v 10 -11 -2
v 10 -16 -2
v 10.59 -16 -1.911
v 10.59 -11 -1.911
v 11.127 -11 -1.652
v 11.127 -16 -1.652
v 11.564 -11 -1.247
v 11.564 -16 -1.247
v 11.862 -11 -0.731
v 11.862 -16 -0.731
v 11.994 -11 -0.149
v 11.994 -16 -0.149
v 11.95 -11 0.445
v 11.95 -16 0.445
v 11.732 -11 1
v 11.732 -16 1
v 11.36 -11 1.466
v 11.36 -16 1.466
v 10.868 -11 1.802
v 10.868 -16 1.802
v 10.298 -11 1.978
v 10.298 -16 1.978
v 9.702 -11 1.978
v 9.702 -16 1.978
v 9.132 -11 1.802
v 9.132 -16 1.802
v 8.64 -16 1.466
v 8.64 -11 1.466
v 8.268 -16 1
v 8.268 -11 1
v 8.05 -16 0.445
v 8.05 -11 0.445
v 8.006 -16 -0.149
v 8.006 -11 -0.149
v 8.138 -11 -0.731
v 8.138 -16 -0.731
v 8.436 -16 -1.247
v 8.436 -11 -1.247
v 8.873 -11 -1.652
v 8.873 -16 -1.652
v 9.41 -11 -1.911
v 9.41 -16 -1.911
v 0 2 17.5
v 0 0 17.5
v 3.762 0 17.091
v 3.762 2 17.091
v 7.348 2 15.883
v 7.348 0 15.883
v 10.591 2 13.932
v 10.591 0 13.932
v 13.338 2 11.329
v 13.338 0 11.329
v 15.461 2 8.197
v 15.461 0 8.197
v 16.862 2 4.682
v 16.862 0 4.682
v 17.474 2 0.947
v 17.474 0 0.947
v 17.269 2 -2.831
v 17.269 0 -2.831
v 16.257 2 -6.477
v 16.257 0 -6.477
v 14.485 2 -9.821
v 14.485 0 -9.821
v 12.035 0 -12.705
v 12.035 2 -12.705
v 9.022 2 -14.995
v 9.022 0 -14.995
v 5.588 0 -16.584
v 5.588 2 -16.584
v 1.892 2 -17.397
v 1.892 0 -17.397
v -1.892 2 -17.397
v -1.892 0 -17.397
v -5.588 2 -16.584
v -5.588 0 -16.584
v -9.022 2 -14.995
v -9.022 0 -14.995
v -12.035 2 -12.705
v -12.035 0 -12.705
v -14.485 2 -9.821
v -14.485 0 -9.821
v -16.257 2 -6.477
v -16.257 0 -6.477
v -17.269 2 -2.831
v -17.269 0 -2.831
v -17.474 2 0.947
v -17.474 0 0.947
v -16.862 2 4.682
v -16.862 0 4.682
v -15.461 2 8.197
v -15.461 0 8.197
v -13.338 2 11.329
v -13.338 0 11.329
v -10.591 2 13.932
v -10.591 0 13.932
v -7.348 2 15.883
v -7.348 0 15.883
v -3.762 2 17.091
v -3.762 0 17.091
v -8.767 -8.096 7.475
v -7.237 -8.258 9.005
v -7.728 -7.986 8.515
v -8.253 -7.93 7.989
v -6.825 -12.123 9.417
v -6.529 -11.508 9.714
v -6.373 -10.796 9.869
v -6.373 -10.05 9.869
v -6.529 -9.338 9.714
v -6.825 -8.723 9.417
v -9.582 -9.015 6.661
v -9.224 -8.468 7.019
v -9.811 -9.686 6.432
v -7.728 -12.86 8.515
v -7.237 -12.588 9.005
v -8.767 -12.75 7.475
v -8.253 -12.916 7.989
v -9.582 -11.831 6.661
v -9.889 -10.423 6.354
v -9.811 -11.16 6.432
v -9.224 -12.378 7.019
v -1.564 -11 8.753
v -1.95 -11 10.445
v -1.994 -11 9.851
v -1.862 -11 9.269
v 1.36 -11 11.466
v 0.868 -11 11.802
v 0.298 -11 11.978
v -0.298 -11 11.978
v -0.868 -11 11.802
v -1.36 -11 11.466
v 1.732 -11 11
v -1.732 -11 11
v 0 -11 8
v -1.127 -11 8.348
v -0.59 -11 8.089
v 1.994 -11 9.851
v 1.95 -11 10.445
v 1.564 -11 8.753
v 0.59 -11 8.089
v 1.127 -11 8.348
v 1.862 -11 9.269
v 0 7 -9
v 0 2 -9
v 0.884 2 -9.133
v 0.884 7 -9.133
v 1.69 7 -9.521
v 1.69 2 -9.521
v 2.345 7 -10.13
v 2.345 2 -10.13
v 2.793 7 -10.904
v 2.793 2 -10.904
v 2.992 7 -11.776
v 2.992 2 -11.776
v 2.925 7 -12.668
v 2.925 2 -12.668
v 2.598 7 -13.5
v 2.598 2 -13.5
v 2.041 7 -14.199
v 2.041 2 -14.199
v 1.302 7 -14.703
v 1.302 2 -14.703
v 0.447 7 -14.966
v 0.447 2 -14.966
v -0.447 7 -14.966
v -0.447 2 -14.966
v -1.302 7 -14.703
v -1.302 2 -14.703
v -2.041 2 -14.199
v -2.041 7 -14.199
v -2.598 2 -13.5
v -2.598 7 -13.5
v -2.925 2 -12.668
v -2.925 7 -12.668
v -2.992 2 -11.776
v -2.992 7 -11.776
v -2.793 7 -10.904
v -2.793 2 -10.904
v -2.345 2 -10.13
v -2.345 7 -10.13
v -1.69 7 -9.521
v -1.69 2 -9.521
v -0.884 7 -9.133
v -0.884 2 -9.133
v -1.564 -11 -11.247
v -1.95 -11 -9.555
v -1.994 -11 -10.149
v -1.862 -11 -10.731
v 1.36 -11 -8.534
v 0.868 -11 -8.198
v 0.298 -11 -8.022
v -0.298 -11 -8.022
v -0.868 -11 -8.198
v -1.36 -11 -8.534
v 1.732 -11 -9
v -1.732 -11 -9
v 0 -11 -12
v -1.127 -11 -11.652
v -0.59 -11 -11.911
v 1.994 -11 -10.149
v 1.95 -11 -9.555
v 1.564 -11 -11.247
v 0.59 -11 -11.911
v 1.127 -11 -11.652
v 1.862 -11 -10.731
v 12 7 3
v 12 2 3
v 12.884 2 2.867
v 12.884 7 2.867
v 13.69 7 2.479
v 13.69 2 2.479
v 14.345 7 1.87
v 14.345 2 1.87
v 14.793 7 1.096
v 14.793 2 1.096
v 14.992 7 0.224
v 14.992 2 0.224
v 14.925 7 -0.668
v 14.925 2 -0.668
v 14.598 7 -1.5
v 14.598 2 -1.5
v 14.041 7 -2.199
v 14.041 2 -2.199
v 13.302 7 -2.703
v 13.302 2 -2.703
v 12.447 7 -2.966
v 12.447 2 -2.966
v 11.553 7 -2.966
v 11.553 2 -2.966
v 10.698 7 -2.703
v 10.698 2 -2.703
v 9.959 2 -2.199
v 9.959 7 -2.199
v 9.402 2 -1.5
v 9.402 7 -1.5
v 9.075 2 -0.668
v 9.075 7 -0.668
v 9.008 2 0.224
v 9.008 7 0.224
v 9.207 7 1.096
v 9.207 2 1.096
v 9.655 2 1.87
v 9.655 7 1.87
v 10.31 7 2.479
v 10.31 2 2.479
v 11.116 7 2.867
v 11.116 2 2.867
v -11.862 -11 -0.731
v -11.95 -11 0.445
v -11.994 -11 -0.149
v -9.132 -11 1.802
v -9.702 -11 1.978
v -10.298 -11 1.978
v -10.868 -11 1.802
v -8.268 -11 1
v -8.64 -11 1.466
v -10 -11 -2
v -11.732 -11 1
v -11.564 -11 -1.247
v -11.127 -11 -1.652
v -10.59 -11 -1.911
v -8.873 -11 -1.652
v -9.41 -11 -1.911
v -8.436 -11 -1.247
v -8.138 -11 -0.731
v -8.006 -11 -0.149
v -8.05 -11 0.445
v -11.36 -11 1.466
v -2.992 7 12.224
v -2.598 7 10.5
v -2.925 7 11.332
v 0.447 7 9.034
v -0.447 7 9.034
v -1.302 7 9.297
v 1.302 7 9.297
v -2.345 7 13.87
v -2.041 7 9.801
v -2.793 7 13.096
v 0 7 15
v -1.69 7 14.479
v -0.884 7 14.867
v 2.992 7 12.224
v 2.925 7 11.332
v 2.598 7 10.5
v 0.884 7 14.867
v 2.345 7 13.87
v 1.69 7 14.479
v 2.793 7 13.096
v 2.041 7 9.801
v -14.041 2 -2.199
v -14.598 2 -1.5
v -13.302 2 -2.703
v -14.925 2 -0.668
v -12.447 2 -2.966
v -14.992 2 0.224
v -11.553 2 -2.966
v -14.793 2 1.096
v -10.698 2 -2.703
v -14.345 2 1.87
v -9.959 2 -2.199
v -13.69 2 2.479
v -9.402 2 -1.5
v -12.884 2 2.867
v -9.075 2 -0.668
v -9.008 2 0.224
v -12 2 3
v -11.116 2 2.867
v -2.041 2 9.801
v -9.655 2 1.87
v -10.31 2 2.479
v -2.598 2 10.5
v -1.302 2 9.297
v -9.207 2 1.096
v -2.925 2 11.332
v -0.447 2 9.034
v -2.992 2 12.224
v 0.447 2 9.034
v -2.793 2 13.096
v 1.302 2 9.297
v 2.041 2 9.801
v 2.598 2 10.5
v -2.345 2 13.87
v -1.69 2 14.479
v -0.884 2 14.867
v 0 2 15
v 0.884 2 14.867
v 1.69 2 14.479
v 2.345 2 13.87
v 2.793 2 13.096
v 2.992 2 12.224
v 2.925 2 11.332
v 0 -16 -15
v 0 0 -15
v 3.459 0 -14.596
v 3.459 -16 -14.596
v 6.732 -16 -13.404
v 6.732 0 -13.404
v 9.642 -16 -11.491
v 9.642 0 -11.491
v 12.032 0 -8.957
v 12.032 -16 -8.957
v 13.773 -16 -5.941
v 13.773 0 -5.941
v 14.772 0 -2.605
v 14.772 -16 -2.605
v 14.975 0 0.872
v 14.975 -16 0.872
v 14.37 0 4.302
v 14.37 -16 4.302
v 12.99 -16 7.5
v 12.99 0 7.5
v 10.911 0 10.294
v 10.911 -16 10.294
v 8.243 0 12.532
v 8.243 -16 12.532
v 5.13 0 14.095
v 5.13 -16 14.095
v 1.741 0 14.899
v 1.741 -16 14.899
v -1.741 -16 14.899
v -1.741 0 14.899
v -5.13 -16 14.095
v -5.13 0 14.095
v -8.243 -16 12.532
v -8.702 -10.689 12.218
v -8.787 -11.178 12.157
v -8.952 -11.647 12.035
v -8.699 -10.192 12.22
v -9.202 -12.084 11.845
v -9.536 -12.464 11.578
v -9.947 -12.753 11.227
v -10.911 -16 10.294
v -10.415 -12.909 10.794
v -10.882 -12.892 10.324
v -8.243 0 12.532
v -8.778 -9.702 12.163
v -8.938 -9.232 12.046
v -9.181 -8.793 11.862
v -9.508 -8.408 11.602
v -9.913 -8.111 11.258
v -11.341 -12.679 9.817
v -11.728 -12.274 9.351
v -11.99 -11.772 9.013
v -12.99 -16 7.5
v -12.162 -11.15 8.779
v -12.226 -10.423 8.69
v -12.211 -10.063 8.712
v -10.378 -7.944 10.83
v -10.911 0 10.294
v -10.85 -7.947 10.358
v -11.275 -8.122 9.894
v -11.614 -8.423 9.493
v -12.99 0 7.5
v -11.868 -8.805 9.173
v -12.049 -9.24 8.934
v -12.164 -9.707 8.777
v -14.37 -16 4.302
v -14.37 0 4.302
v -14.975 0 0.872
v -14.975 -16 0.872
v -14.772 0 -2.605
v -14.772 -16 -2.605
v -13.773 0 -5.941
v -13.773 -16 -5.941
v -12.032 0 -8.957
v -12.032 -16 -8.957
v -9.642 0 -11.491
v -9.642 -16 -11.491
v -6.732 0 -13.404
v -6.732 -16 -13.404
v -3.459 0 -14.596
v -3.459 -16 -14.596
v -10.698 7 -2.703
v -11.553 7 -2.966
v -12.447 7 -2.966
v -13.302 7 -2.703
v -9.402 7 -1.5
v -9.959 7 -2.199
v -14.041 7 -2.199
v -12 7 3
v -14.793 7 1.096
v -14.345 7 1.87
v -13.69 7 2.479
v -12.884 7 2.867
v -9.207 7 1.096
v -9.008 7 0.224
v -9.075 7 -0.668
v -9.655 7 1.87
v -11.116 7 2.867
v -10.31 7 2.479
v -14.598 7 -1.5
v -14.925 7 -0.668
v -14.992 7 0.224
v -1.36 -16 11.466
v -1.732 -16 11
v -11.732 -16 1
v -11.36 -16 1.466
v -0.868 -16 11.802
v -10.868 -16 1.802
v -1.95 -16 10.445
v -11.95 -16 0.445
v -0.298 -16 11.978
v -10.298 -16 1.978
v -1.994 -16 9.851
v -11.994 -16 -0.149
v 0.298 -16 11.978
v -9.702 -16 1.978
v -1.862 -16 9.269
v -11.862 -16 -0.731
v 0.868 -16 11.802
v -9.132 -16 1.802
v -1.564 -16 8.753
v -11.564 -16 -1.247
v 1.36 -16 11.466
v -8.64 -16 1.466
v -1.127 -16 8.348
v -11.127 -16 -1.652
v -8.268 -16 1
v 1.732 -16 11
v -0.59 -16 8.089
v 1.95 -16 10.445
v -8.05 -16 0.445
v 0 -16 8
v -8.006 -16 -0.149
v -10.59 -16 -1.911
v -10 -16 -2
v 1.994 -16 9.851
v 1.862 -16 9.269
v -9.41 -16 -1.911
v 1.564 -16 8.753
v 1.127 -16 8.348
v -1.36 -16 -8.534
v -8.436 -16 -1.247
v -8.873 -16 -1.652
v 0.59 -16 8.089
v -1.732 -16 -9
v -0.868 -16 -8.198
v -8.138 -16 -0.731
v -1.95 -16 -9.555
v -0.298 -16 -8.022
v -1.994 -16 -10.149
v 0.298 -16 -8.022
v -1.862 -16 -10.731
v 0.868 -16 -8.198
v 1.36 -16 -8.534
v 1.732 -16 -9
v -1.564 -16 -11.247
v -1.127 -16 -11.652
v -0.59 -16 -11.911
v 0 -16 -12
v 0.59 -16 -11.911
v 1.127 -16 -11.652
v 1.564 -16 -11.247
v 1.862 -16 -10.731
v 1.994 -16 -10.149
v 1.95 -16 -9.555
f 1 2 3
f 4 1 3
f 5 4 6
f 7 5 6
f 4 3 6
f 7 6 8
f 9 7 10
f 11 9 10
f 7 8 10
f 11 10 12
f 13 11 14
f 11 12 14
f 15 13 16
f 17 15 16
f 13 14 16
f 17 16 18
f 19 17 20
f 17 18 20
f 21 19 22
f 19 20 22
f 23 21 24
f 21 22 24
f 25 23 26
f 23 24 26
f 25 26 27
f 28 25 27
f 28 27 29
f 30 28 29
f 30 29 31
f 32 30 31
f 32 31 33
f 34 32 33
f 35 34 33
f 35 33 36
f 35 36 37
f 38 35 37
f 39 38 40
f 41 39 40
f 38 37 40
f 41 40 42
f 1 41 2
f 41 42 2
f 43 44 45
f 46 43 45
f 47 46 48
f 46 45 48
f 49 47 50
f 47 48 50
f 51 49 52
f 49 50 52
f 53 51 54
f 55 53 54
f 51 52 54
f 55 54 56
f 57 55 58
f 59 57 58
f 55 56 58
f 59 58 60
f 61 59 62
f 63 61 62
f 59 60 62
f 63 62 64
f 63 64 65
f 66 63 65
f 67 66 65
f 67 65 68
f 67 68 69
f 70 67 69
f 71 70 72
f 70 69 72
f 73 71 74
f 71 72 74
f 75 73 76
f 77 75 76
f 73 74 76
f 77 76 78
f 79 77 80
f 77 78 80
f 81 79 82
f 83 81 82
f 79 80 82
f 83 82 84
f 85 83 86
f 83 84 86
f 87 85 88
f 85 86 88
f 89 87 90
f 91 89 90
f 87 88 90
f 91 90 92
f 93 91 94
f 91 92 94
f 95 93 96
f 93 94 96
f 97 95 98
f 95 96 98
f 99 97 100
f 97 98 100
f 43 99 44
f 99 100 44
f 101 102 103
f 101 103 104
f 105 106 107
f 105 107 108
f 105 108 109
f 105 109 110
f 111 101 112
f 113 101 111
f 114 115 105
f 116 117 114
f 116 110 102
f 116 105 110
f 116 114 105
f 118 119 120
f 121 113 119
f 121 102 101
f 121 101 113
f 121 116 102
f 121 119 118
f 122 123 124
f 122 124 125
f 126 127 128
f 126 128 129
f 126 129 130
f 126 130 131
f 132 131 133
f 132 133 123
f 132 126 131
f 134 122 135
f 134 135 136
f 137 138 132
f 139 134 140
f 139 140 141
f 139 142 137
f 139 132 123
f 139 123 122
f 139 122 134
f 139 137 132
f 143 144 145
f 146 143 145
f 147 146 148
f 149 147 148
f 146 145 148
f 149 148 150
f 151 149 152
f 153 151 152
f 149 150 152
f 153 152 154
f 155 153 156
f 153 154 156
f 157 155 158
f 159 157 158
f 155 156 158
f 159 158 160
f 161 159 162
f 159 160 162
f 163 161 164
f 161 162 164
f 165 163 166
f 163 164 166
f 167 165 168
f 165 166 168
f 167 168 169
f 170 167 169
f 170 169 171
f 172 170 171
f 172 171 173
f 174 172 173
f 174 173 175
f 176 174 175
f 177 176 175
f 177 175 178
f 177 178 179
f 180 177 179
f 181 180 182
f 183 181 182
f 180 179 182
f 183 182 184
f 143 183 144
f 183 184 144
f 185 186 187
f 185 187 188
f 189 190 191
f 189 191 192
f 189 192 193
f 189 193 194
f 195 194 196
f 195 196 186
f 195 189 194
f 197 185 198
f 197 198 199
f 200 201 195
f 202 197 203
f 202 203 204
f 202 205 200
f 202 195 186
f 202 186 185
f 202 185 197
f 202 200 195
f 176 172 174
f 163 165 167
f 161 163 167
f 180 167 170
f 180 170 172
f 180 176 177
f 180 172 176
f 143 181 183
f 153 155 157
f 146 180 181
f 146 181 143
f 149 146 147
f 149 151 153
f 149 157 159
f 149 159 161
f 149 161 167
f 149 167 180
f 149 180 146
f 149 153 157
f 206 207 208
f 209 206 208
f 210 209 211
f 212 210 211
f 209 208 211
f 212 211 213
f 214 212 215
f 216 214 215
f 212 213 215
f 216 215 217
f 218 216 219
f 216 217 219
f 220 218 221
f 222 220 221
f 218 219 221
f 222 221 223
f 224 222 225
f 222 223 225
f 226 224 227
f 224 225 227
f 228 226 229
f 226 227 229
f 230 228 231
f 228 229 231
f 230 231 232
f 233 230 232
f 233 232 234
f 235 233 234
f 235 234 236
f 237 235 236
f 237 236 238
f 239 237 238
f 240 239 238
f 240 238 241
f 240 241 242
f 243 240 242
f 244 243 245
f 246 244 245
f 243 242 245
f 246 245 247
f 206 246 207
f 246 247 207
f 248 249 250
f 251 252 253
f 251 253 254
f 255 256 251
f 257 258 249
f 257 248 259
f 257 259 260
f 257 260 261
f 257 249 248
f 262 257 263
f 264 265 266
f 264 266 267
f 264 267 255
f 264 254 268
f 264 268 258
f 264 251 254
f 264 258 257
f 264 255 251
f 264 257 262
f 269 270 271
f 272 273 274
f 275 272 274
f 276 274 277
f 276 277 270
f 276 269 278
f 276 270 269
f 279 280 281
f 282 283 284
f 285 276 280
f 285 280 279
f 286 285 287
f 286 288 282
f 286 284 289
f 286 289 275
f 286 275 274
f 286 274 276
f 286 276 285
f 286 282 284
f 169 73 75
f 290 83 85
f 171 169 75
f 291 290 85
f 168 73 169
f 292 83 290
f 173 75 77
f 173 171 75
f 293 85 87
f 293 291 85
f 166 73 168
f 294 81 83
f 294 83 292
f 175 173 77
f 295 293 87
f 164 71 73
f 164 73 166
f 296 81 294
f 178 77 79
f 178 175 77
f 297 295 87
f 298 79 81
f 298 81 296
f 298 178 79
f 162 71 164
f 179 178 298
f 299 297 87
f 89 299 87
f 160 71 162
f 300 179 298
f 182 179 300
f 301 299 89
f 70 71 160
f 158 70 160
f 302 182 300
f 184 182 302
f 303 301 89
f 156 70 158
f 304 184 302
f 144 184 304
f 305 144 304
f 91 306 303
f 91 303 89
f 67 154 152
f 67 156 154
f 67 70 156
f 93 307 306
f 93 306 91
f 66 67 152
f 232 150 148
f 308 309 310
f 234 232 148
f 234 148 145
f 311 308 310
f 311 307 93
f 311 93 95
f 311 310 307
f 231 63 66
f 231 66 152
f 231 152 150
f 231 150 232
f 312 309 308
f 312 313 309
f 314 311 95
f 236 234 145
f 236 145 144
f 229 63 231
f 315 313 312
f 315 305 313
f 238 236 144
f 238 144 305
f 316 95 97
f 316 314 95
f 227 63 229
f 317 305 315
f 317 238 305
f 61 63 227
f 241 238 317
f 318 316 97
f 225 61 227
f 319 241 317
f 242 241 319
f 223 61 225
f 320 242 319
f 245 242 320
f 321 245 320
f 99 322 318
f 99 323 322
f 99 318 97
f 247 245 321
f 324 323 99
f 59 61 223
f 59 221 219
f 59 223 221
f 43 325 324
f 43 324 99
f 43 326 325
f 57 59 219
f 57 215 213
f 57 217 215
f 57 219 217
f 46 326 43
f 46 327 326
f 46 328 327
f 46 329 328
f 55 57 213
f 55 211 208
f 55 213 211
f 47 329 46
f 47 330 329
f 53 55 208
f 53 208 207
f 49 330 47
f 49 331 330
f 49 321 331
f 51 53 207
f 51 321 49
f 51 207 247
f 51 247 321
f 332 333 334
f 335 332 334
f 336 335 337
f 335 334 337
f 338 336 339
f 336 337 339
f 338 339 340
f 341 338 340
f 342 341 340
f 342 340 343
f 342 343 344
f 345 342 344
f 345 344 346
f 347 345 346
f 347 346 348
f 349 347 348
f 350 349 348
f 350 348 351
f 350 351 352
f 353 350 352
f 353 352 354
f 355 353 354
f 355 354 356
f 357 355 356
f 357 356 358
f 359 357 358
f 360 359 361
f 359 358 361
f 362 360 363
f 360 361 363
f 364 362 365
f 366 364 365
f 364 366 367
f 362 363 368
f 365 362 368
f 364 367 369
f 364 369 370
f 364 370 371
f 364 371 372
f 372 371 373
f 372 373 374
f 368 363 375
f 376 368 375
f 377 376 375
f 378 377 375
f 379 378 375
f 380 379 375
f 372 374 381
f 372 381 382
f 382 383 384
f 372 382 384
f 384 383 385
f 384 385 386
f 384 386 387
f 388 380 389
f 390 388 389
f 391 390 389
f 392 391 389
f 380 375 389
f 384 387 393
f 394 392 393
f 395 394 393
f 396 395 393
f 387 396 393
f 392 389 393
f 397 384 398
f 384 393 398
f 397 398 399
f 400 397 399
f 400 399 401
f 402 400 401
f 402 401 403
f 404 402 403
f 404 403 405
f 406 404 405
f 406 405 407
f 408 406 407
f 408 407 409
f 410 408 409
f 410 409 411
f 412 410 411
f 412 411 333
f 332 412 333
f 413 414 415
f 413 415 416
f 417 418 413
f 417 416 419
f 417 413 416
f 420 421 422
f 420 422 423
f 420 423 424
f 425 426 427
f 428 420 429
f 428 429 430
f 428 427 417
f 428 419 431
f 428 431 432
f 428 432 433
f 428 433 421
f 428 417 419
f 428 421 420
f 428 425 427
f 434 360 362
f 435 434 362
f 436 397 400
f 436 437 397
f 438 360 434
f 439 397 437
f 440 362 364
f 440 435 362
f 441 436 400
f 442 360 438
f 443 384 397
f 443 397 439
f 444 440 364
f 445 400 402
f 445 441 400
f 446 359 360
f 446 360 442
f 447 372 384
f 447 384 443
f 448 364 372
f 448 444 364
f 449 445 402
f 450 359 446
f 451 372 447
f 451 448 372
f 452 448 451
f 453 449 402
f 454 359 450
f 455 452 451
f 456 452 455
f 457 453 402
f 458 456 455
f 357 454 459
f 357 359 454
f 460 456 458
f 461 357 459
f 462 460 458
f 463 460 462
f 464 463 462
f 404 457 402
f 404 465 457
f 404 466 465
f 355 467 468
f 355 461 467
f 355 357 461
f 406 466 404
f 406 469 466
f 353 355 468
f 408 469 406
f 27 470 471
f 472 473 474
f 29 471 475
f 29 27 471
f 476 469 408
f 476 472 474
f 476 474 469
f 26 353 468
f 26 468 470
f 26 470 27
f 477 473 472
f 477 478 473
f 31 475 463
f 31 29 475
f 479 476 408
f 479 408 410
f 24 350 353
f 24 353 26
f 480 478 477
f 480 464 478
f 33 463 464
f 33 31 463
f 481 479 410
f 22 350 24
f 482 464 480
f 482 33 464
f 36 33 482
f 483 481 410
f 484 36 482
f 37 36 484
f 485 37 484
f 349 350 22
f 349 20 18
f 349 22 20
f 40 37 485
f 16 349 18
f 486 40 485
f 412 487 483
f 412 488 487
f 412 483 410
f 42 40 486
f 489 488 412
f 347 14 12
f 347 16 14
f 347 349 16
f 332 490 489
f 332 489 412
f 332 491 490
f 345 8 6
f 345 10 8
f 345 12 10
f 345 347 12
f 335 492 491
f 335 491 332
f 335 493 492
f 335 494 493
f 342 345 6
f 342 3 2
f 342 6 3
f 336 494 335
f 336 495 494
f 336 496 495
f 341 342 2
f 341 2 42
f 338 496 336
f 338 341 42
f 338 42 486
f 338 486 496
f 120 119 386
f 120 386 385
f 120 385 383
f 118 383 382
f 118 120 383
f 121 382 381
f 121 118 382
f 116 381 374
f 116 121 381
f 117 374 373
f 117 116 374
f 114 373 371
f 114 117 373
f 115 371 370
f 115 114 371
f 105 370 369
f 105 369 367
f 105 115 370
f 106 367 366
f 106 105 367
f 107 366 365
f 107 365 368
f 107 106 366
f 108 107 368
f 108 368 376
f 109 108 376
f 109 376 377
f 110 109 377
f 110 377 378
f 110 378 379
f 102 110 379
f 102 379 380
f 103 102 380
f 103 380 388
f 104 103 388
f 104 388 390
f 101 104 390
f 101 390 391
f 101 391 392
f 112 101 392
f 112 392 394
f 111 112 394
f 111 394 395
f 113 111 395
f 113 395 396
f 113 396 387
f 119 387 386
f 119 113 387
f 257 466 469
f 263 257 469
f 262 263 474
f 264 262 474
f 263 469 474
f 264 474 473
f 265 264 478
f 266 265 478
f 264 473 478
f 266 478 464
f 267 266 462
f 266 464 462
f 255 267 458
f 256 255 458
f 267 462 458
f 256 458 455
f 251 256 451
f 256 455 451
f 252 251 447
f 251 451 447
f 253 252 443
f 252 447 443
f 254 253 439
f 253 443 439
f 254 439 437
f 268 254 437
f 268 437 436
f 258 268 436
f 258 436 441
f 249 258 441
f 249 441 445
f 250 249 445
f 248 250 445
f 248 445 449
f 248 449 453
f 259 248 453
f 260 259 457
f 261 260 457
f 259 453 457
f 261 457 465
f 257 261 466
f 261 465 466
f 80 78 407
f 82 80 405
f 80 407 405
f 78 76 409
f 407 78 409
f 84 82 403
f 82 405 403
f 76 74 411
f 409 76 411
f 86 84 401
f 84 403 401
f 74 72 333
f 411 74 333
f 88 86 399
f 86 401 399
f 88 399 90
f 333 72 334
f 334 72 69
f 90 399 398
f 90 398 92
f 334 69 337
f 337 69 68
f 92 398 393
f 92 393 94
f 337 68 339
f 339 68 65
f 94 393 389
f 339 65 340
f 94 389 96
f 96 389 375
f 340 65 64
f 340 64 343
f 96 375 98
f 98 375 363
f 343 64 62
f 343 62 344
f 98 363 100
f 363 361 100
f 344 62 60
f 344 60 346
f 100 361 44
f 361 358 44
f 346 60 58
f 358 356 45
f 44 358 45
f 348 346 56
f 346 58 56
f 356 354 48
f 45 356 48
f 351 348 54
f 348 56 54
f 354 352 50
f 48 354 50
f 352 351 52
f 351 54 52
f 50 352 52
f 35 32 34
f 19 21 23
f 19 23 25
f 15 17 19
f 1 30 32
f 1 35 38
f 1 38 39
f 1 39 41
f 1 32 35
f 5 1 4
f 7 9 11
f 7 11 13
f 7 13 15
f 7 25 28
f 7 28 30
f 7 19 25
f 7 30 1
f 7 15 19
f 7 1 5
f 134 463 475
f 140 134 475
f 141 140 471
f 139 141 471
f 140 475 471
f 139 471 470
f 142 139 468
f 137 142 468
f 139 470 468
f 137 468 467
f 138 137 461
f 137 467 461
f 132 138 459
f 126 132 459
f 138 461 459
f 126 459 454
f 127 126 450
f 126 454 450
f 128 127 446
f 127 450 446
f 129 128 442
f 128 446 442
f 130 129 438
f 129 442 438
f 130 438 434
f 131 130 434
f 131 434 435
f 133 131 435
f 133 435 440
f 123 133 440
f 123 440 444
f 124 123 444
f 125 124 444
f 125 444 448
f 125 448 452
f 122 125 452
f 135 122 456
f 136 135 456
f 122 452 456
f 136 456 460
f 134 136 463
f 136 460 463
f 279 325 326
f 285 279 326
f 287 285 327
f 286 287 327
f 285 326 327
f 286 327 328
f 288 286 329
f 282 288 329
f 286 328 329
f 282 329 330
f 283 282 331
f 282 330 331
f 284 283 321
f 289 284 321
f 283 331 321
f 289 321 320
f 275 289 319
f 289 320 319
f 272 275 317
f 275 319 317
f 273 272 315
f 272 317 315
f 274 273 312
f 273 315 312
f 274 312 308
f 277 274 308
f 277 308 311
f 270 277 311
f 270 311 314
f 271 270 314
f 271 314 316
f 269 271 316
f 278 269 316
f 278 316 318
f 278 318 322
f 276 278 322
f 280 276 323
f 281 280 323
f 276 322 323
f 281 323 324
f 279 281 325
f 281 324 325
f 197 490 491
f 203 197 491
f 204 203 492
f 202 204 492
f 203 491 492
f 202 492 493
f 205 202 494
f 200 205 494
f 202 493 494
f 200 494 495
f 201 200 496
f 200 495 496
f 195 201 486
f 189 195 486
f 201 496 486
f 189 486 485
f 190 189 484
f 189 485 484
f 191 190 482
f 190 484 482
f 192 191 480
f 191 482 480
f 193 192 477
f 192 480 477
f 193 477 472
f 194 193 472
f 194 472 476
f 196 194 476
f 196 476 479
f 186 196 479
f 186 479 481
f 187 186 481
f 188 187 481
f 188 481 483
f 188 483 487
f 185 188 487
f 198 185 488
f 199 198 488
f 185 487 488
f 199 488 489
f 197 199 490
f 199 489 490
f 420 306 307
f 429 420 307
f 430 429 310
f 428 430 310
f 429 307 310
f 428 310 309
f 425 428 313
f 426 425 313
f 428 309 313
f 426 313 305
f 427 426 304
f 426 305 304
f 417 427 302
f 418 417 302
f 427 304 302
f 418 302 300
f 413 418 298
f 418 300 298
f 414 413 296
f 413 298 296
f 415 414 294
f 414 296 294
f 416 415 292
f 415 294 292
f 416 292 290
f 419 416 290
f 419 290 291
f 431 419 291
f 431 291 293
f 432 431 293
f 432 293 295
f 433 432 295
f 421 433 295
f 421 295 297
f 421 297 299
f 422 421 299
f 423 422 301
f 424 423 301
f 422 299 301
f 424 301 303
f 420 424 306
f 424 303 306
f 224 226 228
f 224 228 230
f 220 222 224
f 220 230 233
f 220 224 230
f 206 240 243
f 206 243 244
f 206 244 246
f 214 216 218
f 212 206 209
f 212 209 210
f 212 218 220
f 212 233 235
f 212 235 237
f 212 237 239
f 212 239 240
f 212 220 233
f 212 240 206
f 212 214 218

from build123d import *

# Parameters (mm, degrees)
SKETCH1_R           = 17.5
BOSS_EXTRUDE1_DEPTH = 2
SKETCH2_R           = 3
BOSS_EXTRUDE2_DEPTH = 5
SKETCH3_R           = 15
BOSS_EXTRUDE3_DEPTH = 16
SKETCH4_R           = 2
CUT_EXTRUDE1_DEPTH  = 5
SKETCH5_R           = 2.5
CUT_EXTRUDE2_DEPTH  = 10


with BuildPart() as part:
    # Sketch1 → Boss-Extrude1 (new body)
    with BuildSketch(Plane(origin=(0, 0, 0), x_dir=(1, 0, 0), z_dir=(0, 1, 0))):
        with Locations(Location((0, 0, 0), (0, 0, 270))):
            Circle(SKETCH1_R)
    extrude(amount=BOSS_EXTRUDE1_DEPTH)

    # Sketch2 → Boss-Extrude2 (add)
    with BuildSketch(Plane(origin=(0, 2, 0), x_dir=(1, 0, 0), z_dir=(0, 1, 0))):
        with Locations(Location((12, 0, 0), (0, 0, 270))):
            Circle(SKETCH2_R)
        with Locations(Location((0, -12, 0), (0, 0, 270))):
            Circle(SKETCH2_R)
        with Locations(Location((-12, 0, 0), (0, 0, 270))):
            Circle(SKETCH2_R)
        with Locations(Location((0, 12, 0), (0, 0, 270))):
            Circle(SKETCH2_R)
    extrude(amount=BOSS_EXTRUDE2_DEPTH)

    # Sketch3 → Boss-Extrude3 (add)
    with BuildSketch(Plane.XZ):
        with Locations(Location((0, 0, 0), (0, 0, 270))):
            Circle(SKETCH3_R)
    extrude(amount=BOSS_EXTRUDE3_DEPTH)

    # Sketch4 → Cut-Extrude1 (cut)
    with BuildSketch(Plane.XZ.offset(16)):
        with Locations(Location((-10, 0, 0), (0, 0, 270))):
            Circle(SKETCH4_R)
        with Locations(Location((0, 10, 0), (0, 0, 270))):
            Circle(SKETCH4_R)
        with Locations(Location((10, 0, 0), (0, 0, 270))):
            Circle(SKETCH4_R)
        with Locations(Location((0, -10, 0), (0, 0, 270))):
            Circle(SKETCH4_R)
    extrude(amount=-CUT_EXTRUDE1_DEPTH, mode=Mode.SUBTRACT)

    # Sketch5 → Cut-Extrude2 (cut)
    with BuildSketch(Plane(origin=(-8.121320344, 0, 8.121320344), x_dir=(0.7071067811865439, 0, 0.7071067811865512), z_dir=(-0.7071067811865512, 0, 0.7071067811865439))):
        with Locations(Location((0, -10.42298086, 0), (0, 0, 180))):
            Circle(SKETCH5_R)
    extrude(amount=CUT_EXTRUDE2_DEPTH, mode=Mode.SUBTRACT)


solid = part.part
